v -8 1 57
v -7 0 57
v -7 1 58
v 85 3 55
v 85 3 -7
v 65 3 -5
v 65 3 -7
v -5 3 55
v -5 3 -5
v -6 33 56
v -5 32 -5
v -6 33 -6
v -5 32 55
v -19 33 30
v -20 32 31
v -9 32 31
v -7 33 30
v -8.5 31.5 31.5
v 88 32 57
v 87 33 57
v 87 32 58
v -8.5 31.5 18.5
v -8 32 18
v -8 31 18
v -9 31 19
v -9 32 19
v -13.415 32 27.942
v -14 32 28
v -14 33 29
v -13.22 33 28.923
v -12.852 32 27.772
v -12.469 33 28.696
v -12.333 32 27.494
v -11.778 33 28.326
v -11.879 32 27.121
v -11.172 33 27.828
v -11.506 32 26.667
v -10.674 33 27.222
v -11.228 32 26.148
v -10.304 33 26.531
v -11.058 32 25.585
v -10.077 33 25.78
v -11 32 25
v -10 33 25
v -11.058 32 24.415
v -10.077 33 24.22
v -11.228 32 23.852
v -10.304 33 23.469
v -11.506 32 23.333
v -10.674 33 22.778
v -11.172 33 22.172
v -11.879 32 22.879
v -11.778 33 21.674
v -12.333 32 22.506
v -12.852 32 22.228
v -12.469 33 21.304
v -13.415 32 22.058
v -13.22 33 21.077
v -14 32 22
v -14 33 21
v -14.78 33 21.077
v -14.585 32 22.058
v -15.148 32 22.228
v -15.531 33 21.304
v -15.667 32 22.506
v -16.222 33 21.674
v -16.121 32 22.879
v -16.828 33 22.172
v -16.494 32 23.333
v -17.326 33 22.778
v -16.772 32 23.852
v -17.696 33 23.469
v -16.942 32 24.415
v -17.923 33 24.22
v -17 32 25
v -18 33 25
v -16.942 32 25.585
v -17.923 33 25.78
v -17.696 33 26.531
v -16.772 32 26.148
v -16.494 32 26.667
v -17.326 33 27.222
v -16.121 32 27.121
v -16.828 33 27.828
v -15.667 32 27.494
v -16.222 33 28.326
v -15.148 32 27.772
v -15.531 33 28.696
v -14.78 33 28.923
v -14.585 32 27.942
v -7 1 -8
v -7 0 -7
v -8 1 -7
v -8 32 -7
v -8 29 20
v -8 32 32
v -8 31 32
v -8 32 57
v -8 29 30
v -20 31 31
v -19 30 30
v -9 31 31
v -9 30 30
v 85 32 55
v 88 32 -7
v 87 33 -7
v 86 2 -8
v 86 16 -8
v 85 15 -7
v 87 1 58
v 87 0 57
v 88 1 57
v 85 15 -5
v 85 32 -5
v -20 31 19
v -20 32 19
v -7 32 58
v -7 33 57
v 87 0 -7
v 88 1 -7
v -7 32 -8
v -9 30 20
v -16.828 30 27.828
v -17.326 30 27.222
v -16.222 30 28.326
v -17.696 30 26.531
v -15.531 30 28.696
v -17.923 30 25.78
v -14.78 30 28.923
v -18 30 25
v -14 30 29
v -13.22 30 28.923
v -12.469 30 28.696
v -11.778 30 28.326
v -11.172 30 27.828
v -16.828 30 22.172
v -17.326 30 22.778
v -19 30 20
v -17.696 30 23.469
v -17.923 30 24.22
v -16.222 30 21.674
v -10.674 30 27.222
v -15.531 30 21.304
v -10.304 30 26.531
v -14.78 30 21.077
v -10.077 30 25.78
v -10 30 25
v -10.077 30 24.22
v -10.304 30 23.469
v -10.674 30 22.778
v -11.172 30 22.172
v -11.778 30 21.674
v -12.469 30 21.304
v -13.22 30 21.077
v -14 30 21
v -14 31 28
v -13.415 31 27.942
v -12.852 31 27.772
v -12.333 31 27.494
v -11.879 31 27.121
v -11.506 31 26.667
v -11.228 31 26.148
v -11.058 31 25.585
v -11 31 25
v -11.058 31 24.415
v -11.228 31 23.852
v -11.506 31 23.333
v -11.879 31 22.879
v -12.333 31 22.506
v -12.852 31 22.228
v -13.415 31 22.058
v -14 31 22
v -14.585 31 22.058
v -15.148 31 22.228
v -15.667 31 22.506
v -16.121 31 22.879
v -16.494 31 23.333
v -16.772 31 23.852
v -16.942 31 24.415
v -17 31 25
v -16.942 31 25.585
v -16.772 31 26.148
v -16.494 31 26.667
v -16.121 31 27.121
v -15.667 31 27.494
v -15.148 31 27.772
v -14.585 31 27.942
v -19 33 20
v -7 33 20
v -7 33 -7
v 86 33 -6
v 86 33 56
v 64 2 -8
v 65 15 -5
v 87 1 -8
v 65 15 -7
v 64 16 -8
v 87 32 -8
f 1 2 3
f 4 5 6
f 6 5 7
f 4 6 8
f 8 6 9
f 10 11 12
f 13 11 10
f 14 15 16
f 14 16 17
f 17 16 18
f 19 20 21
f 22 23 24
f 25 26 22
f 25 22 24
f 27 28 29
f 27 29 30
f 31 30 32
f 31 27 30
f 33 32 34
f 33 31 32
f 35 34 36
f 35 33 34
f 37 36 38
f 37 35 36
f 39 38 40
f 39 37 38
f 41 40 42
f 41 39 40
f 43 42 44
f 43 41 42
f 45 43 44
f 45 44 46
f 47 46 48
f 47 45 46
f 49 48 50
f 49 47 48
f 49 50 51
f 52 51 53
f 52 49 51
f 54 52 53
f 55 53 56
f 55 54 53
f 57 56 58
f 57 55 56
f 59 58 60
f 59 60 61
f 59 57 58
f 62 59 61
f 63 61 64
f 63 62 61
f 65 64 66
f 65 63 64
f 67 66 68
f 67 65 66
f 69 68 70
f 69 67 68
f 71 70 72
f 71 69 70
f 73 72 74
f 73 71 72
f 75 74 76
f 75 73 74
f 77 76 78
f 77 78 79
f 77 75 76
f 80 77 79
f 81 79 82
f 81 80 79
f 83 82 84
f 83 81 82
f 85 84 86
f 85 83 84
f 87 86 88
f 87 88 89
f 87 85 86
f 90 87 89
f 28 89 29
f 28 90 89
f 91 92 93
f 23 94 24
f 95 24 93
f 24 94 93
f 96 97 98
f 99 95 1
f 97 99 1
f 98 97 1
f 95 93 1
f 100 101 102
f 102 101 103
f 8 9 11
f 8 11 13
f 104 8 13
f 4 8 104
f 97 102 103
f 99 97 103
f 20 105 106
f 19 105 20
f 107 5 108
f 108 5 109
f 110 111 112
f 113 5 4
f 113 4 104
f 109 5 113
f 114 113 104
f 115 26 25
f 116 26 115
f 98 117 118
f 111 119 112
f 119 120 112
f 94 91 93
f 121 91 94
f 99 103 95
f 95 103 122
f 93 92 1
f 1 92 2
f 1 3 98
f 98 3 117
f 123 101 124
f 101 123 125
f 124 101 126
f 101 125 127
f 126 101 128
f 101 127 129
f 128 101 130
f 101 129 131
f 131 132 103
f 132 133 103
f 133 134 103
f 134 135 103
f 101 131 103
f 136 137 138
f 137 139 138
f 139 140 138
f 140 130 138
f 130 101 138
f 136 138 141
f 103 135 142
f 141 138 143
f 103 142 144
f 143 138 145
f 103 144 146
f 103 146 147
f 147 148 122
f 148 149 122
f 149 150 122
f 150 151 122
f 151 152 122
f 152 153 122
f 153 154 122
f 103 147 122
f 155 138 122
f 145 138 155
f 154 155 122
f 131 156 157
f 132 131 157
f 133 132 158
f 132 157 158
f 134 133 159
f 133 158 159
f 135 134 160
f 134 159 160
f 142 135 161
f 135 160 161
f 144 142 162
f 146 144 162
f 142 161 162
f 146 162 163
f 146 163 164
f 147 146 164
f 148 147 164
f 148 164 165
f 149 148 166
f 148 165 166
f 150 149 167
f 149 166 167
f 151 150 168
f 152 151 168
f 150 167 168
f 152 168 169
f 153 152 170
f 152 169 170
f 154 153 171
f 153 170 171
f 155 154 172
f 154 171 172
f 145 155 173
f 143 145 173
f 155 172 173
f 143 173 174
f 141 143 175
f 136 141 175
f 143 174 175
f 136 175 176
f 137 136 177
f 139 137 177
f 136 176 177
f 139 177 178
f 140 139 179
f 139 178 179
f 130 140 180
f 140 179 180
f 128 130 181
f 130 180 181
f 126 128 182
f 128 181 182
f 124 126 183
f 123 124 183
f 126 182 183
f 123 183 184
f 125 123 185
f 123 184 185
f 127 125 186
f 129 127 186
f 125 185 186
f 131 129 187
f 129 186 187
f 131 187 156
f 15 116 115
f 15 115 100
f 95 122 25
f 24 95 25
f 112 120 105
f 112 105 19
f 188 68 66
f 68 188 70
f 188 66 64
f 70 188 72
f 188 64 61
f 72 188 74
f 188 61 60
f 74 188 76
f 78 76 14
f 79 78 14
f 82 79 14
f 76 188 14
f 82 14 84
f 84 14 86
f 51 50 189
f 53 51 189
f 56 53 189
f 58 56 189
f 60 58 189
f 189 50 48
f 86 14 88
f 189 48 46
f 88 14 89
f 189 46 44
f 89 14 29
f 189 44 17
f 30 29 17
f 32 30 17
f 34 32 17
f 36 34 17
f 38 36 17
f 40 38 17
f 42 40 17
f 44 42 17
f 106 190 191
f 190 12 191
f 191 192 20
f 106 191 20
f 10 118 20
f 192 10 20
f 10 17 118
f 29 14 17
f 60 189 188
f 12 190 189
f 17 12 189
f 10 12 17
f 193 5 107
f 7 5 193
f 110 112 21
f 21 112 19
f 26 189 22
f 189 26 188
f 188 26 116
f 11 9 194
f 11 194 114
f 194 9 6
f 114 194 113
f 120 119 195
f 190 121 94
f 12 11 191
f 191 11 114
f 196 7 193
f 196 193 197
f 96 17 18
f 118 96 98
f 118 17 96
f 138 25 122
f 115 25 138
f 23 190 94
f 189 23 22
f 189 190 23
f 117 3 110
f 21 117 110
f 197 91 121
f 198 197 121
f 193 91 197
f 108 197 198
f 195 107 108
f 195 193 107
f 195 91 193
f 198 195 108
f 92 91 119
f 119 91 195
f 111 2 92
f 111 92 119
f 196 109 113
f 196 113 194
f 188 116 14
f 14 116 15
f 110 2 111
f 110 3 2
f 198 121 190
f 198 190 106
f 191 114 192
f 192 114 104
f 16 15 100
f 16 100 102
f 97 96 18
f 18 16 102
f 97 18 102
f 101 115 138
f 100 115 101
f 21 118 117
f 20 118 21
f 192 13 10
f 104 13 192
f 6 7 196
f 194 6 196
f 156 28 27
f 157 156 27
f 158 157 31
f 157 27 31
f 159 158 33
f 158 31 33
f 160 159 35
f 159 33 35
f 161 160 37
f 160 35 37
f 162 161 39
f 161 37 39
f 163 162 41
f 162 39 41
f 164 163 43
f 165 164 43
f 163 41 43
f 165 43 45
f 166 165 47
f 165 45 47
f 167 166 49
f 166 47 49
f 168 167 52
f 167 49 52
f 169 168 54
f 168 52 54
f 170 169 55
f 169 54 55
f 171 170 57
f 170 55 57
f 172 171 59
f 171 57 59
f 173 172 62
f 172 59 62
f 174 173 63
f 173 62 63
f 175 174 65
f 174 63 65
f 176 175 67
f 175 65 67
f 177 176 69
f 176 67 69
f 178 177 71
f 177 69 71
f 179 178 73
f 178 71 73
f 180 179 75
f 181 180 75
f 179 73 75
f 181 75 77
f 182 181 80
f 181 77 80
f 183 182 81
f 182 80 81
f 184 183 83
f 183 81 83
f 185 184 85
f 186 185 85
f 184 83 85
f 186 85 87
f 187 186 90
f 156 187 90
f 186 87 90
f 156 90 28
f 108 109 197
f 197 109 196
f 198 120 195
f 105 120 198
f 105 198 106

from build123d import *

# Parameters (mm, degrees)
SKETCH_1_W          = 80
SKETCH_1_H          = 50
EXTRUDE_1_DEPTH     = 3
SKETCH_2_W          = 90
SKETCH_2_H          = 60
SKETCH_2_W_2        = 80
SKETCH_2_H_2        = 50
EXTRUDE_3_DEPTH     = 3
SKETCH_2_3_W        = 96
SKETCH_2_3_H        = 66
SKETCH_2_3_W_2      = 90
SKETCH_2_3_H_2      = 60
EXTRUDE_4_DEPTH     = 33
SKETCH_3_W          = 20
SKETCH_3_H          = 12
CUT_EXTRUDE_1_DEPTH = 10
SKETCH_4_R          = 3
EXTRUDE_5_DEPTH     = 3
CHAMFER_1_SIZE      = 1
CHAMFER_2_SIZE      = 1


with BuildPart() as part:
    # 草图1 → 凸台-拉伸1 (new body)
    with BuildSketch(Plane(origin=(0, 0, 0), x_dir=(1, 0, 0), z_dir=(0, 1, 0))):
        with Locations((40, -25)):
            Rectangle(SKETCH_1_W, SKETCH_1_H)
    extrude(amount=EXTRUDE_1_DEPTH)

    # 草图2 → 凸台-拉伸3 (add)
    with BuildSketch(Plane.XZ):
        with Locations((40, 25)):
            Rectangle(SKETCH_2_W, SKETCH_2_H)
        with Locations((40, 25)):
            Rectangle(SKETCH_2_W_2, SKETCH_2_H_2, mode=Mode.SUBTRACT)
    extrude(amount=-EXTRUDE_3_DEPTH)

    # 草图2<3> → 凸台-拉伸4 (add)
    with BuildSketch(Plane.XZ):
        with Locations((40, 25)):
            Rectangle(SKETCH_2_3_W, SKETCH_2_3_H)
        with Locations((40, 25)):
            Rectangle(SKETCH_2_3_W_2, SKETCH_2_3_H_2, mode=Mode.SUBTRACT)
    extrude(amount=-EXTRUDE_4_DEPTH)

    # 草图3 → 切除-拉伸1 (cut)
    with BuildSketch(Plane(origin=(0, 0, -8), x_dir=(-1, 0, 0), z_dir=(0, 0, -1))):
        with Locations((-75, 9)):
            Rectangle(SKETCH_3_W, SKETCH_3_H)
    extrude(amount=-CUT_EXTRUDE_1_DEPTH, mode=Mode.SUBTRACT)

    # 草图4 → 凸台-拉伸5 (add)
    with BuildSketch(Plane(origin=(0, 33, 0), x_dir=(1, 0, 0), z_dir=(0, 1, 0))):
        Polygon((-8, -25), (-8, -19), (-20, -19), (-20, -25), (-20, -31), (-8, -31), align=None)
        with Locations(Location((-14, -25, 0), (0, 0, 270))):
            Circle(SKETCH_4_R, mode=Mode.SUBTRACT)
    extrude(amount=-EXTRUDE_5_DEPTH)

    # 倒角1
    chamfer_1_edges = [part.edges().sort_by_distance(p)[0] for p in [
        (88, 0, 25),
        (40, 0, 58),
        (-8, 0, 25),
        (40, 0, -8),
        (40, 33, 58),
        (-8, 16.5, 58),
        (-8, 33, 44.5),
        (-8, 16.5, -8),
        (40, 33, -8),
        (88, 16.5, -8),
        (88, 33, 25),
        (88, 16.5, 58),
        (85, 33, 25),
        (40, 33, 55),
        (-5, 33, 25),
        (40, 33, -5),
        (85, 9, -8),
        (75, 3, -8),
        (65, 9, -8),
        (75, 15, -8),
        (-8, 33, 5.5),
        (-14, 33, 31),
        (-14, 33, 19),
        (-20, 33, 25),
        (-14, 33, 22),
    ]]
    chamfer(chamfer_1_edges, length=CHAMFER_1_SIZE)

    # 倒角2
    chamfer_2_edges = [part.edges().sort_by_distance(p)[0] for p in [
        (-14, 30, 31),
        (-8, 31, 31),
        (-20, 30, 25),
        (-14, 30, 19),
        (-8, 30, 25),
        (-8, 31, 19),
        (-14, 30, 22),
    ]]
    chamfer(chamfer_2_edges, length=CHAMFER_2_SIZE)


solid = part.part
